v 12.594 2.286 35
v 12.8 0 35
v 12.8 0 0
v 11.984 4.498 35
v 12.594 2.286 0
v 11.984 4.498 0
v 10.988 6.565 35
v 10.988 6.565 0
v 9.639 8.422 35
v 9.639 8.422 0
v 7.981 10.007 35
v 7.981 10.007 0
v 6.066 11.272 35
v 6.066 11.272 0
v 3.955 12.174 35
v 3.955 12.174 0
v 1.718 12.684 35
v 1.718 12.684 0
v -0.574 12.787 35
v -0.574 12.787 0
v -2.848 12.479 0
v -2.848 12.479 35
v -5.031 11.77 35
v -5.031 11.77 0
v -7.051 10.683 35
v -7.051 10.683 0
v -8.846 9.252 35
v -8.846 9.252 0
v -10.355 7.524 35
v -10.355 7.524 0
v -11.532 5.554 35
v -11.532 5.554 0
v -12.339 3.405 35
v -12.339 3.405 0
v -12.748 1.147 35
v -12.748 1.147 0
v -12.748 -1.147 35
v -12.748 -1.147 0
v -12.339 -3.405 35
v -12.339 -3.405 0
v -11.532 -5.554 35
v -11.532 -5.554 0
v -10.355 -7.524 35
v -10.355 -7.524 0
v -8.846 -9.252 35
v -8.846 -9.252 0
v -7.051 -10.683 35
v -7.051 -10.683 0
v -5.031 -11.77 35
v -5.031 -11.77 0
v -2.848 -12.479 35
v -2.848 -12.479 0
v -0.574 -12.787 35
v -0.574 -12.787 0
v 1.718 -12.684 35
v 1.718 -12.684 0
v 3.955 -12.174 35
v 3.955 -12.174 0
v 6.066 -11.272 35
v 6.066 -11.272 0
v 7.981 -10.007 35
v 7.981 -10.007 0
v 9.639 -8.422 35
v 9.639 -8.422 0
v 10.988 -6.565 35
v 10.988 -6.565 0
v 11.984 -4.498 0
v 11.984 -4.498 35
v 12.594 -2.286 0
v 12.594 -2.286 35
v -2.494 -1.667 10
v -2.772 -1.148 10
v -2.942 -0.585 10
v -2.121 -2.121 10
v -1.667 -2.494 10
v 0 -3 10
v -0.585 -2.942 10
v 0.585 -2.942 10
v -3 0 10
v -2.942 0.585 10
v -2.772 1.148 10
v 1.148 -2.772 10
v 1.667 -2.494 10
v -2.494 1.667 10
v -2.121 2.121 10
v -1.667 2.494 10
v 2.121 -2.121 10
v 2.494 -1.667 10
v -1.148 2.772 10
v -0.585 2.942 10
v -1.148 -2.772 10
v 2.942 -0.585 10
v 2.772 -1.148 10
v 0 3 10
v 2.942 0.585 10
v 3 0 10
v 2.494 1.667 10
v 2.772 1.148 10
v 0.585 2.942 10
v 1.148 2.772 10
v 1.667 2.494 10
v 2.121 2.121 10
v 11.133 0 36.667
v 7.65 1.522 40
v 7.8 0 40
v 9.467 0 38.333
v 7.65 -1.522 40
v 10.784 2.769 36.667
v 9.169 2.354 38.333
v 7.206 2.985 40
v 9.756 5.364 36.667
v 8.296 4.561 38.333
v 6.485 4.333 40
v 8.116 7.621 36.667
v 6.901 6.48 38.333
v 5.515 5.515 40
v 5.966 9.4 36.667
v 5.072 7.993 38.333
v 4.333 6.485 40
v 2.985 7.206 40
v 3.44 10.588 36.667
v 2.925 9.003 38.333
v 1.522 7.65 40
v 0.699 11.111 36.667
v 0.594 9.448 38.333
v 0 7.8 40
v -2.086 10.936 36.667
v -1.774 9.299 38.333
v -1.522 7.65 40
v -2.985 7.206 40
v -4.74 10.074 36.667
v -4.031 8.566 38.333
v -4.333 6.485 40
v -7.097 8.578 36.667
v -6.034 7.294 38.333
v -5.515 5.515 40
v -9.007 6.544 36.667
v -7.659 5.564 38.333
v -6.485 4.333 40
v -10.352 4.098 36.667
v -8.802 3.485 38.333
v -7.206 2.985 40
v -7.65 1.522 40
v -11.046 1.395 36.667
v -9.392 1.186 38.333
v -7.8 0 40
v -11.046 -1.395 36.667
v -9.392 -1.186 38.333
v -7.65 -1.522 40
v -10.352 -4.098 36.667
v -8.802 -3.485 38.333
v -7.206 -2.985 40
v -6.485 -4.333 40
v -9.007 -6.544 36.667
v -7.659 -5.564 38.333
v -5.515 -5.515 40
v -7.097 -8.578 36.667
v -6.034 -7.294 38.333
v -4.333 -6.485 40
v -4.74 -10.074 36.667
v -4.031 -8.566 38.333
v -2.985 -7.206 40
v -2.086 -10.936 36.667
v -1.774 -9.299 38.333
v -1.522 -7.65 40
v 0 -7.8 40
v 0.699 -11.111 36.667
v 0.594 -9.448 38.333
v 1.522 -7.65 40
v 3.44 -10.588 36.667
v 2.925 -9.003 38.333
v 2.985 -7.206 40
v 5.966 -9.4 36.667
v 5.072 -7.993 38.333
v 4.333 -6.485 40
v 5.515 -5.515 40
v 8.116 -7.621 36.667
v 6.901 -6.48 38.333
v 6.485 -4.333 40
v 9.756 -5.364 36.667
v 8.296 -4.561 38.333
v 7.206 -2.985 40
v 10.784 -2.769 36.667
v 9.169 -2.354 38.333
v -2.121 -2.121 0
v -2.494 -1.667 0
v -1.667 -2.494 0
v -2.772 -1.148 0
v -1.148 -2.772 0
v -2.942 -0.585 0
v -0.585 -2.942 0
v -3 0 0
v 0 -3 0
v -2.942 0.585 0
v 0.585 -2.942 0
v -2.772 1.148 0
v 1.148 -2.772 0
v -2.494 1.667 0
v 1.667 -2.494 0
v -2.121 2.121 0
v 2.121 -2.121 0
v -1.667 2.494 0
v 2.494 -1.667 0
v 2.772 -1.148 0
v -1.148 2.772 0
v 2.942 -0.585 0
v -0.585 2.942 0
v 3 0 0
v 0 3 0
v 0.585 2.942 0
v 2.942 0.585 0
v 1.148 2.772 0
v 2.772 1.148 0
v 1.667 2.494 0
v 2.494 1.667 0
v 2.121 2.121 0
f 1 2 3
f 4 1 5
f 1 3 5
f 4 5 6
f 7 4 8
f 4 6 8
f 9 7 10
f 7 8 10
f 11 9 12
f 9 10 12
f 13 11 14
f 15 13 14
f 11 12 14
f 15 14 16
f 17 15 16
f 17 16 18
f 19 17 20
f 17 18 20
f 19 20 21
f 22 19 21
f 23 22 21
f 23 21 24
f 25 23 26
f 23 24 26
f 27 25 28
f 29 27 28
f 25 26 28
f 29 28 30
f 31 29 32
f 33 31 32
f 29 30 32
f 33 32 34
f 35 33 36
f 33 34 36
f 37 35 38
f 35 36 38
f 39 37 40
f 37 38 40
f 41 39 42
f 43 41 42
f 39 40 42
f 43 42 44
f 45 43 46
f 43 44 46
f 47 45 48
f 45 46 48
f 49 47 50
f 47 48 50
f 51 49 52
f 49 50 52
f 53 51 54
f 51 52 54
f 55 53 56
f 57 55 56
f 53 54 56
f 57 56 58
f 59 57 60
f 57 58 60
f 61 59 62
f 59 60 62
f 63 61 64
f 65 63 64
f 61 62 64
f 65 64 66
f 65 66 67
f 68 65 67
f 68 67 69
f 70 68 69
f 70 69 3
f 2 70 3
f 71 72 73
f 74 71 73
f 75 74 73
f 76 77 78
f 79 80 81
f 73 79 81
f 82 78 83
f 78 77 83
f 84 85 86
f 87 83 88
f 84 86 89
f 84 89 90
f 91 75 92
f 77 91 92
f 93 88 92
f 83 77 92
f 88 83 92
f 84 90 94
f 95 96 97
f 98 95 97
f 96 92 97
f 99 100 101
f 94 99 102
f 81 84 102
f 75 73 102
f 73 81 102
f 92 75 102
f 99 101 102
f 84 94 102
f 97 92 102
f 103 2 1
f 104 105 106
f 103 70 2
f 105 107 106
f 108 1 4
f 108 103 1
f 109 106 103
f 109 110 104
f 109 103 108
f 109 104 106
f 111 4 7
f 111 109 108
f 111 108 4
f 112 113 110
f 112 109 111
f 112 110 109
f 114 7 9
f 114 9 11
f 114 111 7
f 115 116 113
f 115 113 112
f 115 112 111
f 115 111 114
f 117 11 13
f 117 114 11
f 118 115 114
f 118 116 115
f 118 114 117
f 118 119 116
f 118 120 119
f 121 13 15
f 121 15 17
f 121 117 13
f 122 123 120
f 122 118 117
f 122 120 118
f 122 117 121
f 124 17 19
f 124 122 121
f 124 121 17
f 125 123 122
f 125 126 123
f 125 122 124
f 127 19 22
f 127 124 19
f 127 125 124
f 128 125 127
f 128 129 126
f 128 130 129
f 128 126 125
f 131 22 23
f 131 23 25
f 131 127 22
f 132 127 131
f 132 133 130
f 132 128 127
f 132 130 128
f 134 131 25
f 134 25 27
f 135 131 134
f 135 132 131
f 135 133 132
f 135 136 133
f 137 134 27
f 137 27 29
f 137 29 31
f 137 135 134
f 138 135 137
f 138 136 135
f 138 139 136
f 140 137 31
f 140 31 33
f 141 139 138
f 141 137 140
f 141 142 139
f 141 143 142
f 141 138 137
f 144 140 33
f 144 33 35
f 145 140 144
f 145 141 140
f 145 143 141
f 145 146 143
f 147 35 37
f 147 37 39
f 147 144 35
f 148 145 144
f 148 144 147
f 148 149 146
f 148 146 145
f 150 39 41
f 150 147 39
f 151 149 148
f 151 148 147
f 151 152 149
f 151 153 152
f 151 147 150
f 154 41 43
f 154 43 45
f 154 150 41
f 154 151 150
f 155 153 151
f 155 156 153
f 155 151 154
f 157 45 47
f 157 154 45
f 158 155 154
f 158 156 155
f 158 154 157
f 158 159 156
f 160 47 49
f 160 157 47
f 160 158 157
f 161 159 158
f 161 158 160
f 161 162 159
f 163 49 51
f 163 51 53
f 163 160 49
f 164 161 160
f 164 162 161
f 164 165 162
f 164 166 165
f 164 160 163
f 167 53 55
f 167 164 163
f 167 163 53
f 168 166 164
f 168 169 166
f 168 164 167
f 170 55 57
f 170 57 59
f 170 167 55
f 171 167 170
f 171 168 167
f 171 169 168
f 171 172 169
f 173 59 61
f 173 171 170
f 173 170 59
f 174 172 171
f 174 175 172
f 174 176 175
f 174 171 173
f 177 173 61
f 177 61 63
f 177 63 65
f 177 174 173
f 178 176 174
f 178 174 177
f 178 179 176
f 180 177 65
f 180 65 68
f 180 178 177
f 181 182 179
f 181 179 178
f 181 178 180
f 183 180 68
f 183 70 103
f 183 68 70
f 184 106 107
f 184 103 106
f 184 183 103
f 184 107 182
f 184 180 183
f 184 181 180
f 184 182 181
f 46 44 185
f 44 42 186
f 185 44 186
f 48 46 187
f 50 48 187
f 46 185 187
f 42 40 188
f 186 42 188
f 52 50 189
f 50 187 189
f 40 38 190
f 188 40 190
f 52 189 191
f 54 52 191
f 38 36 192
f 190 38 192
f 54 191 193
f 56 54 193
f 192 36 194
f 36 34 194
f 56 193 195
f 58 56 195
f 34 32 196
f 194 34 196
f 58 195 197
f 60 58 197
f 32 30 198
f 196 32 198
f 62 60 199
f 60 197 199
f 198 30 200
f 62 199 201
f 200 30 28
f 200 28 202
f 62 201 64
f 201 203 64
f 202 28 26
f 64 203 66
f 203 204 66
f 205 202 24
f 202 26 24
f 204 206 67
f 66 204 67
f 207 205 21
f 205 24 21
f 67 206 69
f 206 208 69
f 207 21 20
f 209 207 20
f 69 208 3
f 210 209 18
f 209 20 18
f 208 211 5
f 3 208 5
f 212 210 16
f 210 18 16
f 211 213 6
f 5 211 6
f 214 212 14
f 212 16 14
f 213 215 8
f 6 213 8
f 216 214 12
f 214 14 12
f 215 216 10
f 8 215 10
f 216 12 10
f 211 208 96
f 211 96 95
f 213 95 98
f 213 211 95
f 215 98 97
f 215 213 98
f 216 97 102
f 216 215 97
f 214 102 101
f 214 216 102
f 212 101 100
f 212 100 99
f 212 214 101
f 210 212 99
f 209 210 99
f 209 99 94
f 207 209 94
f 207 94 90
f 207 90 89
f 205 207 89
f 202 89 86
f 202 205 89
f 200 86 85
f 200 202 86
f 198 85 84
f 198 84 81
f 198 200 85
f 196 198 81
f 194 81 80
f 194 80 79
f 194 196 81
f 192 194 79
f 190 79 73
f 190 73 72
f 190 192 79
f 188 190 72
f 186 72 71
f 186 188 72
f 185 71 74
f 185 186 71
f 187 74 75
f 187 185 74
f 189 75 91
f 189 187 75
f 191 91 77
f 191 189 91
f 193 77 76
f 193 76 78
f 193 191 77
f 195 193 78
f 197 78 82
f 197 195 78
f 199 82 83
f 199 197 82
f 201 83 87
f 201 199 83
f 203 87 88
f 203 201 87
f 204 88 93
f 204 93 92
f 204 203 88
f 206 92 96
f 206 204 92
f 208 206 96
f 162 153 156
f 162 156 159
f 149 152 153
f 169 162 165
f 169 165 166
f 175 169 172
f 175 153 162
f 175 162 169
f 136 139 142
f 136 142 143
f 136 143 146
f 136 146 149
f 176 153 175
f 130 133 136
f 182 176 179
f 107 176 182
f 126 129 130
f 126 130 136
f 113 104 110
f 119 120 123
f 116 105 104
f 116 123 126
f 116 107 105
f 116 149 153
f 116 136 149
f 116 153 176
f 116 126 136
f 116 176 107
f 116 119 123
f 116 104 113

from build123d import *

# Parameters (mm, degrees)
F0_R     = 12.8
F0_R_2   = 3
F1_DEPTH = 40
F2_SIZE  = 5
F3_DEPTH = 10


with BuildPart() as f1:
    # F0 (on Top) → F1 (new body)
    with BuildSketch(Plane.XY):
        Circle(F0_R)
        Circle(F0_R_2, mode=Mode.SUBTRACT)
        Circle(F0_R_2)
    extrude(amount=F1_DEPTH)

    # F2
    f2_edges = [f1.edges().sort_by_distance(p)[0] for p in [
        (-12.8, 0, 40),
    ]]
    chamfer(f2_edges, length=F2_SIZE)

    # F0 (on Top) → F3 (cut)
    with BuildSketch(Plane.XY):
        Circle(F0_R_2)
    extrude(amount=F3_DEPTH, mode=Mode.SUBTRACT)


solid = f1.part
